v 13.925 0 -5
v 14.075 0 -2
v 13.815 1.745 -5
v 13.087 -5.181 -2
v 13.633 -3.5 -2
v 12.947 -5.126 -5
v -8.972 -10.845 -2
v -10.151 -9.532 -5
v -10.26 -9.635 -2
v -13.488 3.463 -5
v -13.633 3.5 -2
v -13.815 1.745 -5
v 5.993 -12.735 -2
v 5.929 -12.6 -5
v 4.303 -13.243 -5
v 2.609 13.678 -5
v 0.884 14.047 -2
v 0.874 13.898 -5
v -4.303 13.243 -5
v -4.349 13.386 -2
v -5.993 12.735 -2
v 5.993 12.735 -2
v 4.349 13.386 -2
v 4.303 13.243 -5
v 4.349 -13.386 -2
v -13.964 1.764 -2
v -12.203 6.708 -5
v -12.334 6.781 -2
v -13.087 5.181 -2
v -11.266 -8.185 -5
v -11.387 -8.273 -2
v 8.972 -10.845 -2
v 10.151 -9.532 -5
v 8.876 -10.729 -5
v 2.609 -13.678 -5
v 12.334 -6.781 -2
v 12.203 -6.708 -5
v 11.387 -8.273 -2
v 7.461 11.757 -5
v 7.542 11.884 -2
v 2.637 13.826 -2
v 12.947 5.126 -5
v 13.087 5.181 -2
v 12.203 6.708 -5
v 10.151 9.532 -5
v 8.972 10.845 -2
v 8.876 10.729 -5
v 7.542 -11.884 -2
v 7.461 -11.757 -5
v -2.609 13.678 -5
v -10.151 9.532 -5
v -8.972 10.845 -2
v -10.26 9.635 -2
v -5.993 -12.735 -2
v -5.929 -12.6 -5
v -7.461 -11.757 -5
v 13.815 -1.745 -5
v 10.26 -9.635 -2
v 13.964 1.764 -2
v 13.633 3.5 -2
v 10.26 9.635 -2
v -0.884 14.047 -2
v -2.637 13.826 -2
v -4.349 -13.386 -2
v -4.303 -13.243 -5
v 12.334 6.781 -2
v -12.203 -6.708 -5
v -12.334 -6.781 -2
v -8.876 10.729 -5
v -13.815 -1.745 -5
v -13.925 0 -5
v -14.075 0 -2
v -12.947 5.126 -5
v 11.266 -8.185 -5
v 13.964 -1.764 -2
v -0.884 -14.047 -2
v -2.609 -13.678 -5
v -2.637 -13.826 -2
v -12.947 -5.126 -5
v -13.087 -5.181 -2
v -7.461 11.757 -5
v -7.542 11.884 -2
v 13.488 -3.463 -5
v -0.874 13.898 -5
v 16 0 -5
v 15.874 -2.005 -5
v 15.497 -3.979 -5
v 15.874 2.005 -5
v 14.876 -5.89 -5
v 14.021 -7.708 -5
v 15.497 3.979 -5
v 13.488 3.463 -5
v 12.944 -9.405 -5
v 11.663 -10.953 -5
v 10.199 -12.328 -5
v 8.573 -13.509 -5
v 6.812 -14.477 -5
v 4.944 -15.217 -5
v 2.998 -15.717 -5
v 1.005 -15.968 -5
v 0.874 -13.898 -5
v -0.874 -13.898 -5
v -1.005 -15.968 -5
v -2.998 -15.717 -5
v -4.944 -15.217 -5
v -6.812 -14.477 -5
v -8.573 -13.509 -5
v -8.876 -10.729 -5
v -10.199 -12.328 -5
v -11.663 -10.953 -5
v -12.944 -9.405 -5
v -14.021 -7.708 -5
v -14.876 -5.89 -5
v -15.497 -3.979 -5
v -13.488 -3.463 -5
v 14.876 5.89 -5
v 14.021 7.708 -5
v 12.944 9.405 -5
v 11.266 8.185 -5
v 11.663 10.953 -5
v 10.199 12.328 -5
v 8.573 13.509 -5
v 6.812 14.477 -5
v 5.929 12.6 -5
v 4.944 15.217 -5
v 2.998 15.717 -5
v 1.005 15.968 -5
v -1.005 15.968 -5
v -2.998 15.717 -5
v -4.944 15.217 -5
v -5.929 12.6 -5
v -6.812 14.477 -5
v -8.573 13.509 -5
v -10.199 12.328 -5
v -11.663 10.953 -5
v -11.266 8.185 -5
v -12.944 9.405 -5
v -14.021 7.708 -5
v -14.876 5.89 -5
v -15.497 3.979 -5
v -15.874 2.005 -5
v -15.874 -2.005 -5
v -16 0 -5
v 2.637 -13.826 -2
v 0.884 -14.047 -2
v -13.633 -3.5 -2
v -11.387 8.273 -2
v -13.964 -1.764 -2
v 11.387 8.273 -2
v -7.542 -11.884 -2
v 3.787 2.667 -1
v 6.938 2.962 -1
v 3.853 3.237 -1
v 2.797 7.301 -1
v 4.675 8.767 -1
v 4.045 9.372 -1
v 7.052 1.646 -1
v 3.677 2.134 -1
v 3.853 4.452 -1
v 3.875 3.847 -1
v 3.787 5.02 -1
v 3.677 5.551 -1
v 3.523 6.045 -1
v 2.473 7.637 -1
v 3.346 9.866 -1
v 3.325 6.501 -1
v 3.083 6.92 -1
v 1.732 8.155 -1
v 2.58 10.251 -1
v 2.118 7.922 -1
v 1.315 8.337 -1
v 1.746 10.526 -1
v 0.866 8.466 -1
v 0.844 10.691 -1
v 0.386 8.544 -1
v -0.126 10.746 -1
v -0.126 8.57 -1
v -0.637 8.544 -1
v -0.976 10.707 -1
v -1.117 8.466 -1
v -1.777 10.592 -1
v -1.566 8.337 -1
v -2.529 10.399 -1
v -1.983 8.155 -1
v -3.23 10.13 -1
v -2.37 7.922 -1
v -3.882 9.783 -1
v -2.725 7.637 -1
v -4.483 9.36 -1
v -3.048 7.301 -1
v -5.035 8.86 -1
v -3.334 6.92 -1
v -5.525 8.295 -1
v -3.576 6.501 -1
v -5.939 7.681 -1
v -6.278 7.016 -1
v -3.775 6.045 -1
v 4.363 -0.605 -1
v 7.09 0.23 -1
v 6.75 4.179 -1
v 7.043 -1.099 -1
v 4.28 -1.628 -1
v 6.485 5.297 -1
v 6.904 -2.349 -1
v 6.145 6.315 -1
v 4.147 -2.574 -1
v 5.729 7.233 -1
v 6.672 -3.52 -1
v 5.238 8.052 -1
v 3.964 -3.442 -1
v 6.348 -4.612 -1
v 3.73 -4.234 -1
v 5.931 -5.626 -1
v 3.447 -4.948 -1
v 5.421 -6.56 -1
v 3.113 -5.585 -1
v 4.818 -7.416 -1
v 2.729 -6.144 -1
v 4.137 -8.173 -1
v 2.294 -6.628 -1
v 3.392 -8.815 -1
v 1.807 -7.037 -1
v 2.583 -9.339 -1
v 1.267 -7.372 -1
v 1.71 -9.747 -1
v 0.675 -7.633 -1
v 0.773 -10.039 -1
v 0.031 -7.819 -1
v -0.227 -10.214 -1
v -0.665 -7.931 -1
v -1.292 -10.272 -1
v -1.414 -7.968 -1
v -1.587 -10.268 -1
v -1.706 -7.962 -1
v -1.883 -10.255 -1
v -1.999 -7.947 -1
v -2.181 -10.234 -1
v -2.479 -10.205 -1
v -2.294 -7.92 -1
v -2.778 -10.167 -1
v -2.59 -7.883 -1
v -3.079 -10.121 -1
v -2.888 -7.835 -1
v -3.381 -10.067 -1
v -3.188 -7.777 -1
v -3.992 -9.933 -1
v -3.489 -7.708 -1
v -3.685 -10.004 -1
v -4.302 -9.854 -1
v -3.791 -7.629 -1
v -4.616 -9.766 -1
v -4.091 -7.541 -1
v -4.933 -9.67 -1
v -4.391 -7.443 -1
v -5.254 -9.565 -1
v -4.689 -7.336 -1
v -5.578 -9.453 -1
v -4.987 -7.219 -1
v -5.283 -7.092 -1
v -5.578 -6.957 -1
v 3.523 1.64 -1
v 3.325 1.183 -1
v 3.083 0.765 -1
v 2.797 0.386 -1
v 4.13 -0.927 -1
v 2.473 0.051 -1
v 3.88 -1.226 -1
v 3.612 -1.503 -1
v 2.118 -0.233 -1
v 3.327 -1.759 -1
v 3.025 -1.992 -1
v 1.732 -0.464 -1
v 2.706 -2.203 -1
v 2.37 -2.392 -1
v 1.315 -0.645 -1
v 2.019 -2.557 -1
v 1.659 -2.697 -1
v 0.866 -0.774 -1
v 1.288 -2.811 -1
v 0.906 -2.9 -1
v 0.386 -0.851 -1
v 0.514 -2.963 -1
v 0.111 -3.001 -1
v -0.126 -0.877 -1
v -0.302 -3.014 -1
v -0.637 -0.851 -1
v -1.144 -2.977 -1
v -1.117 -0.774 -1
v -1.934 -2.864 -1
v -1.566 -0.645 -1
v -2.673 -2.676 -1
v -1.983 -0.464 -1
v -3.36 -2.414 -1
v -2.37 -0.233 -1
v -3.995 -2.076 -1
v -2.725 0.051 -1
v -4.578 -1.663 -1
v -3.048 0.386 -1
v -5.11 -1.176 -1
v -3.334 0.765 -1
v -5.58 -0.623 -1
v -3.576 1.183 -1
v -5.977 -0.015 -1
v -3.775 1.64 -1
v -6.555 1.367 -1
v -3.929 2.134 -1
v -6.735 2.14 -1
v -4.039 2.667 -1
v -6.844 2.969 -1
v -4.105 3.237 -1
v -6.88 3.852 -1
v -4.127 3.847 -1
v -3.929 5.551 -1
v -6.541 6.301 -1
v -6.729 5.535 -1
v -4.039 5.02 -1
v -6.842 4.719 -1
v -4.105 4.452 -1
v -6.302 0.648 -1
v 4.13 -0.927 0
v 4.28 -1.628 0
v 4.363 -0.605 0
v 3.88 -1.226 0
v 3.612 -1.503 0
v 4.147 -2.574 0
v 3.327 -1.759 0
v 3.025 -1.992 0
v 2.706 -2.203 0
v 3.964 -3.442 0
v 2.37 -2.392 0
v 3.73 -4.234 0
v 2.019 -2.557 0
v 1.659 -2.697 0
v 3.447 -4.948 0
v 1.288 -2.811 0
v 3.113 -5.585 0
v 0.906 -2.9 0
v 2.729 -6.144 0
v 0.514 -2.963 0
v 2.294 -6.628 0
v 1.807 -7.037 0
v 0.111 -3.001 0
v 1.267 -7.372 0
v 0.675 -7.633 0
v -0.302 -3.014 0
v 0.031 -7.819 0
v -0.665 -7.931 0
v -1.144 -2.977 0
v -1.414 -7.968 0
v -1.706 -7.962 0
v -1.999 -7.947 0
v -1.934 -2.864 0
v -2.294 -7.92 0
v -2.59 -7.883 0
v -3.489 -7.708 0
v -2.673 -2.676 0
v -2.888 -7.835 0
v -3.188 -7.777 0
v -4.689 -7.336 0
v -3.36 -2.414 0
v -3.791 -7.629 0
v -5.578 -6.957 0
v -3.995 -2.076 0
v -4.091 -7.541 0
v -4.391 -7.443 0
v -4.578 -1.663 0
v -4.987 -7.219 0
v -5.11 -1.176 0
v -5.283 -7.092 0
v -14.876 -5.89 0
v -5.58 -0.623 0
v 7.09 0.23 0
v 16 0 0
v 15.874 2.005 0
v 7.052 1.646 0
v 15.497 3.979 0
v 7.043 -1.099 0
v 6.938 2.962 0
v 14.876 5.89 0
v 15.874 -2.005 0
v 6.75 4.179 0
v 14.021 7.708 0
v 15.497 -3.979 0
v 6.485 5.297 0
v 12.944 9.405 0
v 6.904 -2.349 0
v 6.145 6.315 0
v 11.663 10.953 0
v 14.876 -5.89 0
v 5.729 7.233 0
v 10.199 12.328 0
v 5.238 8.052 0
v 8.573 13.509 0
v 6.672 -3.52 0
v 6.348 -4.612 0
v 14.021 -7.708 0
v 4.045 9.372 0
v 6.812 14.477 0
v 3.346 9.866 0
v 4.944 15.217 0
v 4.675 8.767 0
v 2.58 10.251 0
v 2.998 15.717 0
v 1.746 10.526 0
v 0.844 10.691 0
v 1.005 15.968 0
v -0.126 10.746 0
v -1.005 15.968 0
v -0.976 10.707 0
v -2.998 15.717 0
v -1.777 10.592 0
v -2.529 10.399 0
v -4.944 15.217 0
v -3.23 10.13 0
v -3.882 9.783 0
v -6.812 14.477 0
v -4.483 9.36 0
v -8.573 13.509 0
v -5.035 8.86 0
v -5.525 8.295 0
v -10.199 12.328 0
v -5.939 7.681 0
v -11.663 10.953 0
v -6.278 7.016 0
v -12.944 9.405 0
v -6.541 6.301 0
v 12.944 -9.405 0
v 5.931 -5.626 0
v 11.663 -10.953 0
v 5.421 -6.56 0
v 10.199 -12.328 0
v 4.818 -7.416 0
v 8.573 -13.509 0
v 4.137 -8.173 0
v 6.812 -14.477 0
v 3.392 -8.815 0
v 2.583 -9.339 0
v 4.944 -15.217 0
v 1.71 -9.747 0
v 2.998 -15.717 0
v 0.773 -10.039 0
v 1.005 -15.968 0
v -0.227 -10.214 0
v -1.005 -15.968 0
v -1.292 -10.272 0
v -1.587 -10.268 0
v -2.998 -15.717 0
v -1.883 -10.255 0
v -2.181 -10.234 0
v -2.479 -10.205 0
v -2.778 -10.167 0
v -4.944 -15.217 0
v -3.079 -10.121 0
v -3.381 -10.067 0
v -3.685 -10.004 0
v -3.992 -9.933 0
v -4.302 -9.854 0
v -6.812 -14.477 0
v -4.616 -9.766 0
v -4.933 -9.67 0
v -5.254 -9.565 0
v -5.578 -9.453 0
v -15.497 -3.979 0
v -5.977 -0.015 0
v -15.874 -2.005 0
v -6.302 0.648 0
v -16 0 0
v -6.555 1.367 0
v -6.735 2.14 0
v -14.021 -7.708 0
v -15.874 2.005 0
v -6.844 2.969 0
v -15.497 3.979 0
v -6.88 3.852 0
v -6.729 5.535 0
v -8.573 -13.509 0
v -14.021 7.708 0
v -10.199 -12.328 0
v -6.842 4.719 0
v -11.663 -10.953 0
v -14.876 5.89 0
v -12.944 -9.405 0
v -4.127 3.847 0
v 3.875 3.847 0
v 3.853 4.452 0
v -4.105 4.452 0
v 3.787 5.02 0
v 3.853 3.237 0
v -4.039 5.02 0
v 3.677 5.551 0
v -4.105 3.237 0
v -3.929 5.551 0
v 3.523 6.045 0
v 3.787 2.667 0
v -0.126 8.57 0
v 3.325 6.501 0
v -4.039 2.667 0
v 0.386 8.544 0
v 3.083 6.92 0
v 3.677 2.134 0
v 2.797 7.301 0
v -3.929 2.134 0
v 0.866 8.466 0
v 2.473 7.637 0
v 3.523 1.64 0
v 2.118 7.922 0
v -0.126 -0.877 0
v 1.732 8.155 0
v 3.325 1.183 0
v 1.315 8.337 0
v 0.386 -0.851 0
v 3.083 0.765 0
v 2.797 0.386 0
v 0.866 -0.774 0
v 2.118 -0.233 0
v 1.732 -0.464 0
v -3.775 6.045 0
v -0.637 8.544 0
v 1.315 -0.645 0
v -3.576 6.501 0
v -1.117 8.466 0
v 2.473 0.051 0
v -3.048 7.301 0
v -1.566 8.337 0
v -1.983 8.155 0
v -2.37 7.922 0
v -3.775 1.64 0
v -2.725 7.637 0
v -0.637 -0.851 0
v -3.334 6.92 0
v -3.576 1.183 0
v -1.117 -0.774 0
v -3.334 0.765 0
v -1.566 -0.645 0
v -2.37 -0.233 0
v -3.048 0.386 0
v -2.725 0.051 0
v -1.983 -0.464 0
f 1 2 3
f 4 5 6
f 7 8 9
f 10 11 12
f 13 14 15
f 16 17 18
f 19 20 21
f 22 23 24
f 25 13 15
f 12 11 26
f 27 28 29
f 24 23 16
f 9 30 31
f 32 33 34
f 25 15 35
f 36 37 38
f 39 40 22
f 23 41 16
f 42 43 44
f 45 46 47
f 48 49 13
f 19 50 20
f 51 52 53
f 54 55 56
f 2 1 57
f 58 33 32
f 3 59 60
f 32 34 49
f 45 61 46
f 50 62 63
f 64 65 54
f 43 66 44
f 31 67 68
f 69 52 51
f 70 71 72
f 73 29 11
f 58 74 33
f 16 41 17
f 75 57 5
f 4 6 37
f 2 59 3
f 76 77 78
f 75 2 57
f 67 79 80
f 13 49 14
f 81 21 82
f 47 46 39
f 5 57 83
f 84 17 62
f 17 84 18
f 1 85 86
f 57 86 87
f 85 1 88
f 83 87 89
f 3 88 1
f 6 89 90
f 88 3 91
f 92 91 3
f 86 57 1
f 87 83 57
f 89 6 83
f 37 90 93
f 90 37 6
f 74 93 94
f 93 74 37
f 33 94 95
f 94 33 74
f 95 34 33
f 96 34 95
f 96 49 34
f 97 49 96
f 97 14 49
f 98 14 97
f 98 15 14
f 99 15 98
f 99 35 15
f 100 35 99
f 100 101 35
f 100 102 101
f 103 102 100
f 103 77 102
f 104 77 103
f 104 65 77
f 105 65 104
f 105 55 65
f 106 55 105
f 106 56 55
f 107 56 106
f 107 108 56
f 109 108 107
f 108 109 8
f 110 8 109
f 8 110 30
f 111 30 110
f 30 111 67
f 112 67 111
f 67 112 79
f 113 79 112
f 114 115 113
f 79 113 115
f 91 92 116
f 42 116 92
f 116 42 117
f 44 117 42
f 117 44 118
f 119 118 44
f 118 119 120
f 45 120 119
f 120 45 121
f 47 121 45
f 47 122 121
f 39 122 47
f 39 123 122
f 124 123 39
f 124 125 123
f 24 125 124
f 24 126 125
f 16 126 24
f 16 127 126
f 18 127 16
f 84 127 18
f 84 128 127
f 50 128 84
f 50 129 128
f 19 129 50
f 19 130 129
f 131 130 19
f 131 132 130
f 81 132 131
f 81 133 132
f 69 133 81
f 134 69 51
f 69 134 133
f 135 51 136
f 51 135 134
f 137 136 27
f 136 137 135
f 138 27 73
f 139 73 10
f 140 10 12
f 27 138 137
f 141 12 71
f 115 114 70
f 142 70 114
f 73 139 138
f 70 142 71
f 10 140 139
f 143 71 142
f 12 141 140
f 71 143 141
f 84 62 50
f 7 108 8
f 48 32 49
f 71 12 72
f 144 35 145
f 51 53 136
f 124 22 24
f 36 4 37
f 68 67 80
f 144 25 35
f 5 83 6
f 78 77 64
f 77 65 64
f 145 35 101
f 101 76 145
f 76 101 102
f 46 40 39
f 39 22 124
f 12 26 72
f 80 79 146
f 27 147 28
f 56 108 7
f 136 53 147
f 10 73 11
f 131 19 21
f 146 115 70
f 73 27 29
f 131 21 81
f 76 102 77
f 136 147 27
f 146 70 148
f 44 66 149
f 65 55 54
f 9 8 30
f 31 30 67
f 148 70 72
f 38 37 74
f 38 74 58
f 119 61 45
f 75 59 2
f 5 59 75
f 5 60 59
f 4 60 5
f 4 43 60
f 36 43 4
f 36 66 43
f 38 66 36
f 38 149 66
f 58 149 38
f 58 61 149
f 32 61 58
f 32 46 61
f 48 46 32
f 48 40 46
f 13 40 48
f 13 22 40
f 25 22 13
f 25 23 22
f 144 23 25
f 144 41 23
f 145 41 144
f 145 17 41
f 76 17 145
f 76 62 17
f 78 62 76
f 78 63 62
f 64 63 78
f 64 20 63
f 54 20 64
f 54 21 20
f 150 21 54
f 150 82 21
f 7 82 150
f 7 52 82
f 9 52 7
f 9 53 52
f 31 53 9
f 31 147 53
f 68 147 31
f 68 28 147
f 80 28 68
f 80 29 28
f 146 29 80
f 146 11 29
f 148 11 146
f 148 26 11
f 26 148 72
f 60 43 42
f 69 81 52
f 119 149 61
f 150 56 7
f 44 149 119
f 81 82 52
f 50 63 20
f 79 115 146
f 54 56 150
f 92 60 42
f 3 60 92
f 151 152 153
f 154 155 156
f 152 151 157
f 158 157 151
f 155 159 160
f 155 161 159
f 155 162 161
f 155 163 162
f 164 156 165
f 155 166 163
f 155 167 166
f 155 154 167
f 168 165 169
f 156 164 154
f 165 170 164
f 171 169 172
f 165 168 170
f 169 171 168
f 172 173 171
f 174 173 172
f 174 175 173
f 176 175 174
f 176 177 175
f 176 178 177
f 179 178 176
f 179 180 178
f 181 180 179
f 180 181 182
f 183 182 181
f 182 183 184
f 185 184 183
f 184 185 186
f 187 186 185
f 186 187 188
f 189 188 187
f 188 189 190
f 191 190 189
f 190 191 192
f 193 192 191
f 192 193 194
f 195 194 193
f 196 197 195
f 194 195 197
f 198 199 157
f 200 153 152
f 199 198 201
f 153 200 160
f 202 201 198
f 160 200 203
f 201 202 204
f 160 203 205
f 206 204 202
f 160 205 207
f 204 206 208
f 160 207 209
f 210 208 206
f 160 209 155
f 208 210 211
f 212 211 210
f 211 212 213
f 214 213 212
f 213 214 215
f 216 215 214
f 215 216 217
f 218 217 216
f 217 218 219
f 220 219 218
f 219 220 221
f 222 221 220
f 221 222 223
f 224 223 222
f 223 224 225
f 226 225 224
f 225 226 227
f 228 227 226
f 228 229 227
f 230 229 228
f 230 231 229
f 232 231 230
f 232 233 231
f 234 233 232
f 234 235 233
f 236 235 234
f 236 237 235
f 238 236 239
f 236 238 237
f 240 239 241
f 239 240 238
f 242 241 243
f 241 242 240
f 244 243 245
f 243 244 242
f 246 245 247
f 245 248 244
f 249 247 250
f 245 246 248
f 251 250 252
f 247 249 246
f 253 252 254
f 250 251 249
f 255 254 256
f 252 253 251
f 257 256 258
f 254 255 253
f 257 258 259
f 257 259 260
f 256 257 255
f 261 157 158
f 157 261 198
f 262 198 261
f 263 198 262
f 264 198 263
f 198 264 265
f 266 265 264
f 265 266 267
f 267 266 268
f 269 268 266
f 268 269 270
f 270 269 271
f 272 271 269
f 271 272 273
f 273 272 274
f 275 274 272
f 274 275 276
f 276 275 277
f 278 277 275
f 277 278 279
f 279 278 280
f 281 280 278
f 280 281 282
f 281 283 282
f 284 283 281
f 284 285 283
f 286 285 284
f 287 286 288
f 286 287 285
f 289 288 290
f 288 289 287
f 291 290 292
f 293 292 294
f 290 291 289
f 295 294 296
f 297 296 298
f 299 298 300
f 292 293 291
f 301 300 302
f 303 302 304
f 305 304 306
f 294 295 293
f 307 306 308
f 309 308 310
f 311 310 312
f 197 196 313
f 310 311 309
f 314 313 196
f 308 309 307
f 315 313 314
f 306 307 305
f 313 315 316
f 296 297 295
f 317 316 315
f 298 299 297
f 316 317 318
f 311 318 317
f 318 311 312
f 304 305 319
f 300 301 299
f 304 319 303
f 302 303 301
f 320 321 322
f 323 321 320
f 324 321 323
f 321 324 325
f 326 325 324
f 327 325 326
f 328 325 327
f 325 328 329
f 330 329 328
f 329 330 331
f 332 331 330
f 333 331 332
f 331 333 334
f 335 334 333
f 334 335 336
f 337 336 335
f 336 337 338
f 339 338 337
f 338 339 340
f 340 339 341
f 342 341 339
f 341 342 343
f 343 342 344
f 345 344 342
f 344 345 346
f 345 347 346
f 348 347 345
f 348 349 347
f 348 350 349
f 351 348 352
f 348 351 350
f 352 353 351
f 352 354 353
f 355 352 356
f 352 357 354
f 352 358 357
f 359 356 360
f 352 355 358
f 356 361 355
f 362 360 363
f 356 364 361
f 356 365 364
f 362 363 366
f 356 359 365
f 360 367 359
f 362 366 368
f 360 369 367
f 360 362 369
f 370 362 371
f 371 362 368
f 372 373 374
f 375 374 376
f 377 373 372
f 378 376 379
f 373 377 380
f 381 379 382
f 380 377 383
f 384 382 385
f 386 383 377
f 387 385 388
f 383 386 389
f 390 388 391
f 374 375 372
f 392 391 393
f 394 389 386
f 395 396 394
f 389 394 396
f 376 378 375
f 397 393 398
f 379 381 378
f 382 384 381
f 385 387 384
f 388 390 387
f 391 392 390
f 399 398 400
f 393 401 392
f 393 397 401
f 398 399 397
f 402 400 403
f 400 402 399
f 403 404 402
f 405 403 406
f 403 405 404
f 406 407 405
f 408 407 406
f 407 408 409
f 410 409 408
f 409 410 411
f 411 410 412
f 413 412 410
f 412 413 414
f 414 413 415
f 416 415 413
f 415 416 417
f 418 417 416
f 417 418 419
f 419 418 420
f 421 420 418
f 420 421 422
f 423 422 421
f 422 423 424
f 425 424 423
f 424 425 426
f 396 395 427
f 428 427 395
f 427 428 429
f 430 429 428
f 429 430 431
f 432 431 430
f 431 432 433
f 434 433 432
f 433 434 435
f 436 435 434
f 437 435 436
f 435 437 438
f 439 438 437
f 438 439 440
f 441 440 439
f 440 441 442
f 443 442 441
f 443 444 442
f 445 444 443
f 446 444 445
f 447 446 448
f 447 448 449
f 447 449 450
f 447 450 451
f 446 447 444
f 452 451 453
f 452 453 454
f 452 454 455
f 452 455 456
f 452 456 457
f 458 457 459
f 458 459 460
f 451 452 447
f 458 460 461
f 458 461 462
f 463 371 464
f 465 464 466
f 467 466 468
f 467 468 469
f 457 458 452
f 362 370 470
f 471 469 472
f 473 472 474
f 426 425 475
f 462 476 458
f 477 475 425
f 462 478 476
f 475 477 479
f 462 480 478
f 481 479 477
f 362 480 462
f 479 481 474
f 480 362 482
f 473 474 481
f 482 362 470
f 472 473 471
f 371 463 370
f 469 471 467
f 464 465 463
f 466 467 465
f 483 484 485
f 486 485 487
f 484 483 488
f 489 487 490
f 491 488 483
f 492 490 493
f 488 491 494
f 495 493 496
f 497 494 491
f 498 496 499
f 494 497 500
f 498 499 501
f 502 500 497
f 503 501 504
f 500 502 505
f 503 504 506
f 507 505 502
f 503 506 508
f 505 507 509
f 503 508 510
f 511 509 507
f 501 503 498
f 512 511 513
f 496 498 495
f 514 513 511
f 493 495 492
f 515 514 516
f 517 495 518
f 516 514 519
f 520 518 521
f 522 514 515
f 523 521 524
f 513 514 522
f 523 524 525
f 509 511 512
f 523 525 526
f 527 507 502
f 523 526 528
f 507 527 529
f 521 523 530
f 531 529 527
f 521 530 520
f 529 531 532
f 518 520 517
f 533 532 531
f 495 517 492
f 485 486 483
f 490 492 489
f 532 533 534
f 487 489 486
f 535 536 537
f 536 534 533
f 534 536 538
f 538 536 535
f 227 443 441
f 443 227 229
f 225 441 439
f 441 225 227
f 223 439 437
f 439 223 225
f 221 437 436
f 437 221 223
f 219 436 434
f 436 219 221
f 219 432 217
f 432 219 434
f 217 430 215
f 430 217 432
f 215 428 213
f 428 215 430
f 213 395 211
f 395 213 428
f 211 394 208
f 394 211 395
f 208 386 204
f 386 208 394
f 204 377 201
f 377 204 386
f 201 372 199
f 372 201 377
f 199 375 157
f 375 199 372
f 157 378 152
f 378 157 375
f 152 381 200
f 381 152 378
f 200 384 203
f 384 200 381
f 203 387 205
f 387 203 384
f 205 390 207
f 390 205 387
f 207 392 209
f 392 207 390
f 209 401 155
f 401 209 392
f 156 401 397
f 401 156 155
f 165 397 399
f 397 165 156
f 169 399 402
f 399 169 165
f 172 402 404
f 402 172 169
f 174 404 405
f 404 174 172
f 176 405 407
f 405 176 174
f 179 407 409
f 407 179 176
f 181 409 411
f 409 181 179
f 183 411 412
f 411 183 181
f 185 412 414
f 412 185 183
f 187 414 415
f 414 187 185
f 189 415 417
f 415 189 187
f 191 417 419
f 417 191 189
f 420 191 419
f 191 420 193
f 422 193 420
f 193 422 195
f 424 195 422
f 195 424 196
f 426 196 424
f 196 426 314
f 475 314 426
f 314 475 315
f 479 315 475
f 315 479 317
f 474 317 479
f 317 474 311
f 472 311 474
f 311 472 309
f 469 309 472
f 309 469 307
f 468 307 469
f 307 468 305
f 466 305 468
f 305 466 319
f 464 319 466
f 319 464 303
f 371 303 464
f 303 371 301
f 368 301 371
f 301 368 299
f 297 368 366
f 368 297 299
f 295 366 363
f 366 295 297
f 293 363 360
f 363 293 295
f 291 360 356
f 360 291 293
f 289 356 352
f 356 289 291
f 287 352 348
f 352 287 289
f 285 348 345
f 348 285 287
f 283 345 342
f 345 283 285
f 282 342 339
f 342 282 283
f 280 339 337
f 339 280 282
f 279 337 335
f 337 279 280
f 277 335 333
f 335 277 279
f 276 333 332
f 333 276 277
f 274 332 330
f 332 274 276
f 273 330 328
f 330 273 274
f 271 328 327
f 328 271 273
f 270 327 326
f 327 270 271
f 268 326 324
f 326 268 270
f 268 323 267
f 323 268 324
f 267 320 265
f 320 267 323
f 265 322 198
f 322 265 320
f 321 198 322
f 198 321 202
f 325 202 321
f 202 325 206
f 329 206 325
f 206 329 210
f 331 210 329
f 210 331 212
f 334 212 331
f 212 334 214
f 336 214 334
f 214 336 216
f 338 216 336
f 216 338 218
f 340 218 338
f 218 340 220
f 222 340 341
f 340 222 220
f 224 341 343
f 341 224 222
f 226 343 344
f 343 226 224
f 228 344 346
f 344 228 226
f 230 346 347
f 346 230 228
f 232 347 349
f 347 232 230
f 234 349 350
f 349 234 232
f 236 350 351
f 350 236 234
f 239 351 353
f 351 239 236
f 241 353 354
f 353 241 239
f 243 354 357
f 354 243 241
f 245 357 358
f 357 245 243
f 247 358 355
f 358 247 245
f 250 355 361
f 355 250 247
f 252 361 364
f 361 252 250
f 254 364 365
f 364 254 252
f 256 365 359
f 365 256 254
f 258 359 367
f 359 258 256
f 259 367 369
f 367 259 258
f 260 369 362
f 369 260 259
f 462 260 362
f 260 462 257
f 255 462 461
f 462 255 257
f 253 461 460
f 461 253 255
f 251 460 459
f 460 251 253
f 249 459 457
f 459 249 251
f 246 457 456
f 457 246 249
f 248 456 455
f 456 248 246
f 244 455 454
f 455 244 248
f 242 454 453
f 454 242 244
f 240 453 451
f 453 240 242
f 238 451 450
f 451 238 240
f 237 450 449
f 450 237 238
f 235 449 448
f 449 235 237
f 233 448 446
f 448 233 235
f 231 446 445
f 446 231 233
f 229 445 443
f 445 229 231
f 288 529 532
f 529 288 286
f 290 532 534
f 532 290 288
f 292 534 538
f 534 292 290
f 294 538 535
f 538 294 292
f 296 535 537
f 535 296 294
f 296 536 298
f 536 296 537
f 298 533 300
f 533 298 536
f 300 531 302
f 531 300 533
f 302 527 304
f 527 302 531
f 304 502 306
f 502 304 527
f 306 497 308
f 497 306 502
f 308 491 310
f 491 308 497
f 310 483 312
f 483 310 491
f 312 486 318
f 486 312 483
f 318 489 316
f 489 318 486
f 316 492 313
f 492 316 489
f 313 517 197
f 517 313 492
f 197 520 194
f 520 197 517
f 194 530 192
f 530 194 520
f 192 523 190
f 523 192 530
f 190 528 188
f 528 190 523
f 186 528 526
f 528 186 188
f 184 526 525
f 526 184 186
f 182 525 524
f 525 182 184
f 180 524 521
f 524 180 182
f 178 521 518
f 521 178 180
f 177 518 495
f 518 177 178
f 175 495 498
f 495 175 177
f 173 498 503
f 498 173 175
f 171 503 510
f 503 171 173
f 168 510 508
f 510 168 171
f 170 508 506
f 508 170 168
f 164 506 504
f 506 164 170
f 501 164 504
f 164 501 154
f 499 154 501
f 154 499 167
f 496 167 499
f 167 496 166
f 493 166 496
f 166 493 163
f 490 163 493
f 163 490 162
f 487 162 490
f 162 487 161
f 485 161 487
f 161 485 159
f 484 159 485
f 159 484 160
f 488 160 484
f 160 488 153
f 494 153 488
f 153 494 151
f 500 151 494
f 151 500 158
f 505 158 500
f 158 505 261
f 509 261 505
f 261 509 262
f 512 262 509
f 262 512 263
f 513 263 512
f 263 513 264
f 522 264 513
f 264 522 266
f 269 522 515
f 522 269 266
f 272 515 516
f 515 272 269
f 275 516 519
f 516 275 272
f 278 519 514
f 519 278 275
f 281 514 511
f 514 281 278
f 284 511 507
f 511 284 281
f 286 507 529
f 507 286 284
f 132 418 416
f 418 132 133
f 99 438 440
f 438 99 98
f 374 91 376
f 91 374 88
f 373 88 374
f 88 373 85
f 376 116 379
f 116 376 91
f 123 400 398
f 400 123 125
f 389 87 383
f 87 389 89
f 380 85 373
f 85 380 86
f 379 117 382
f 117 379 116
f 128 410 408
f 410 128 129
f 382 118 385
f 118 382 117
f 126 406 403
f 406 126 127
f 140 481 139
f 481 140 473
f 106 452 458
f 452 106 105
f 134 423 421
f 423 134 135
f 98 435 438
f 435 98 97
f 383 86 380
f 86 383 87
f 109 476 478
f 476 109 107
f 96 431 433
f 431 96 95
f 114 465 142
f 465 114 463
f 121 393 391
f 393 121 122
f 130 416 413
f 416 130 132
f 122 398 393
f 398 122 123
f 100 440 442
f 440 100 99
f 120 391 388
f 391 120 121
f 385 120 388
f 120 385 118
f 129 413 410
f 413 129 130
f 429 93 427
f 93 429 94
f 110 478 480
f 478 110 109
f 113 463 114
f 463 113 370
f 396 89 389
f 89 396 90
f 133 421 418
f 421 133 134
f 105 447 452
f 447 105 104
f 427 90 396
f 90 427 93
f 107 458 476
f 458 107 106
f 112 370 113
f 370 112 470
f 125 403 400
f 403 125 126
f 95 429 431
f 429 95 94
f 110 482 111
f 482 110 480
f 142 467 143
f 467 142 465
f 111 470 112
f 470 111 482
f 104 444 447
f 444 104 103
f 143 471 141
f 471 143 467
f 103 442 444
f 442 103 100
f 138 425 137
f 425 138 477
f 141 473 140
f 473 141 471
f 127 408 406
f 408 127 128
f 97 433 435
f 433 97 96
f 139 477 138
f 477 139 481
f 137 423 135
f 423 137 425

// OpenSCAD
$fn = 50;


difference() {
	union() {
		translate(v = [0, 0, -5.0000000000]) {
			cylinder(h = 5, r = 16.0000000000);
		}
	}
	union() {
		#translate(v = [0, 0, -5.0000000000]) {
			cylinder(h = 3, r1 = 13.9250000000, r2 = 14.0750000000);
		}
		translate(v = [0, 0, -1]) {
			linear_extrude(height = 1) {
				text(font = "Impact", halign = "center", size = 20, text = "9", valign = "center");
			}
		}
	}
}
